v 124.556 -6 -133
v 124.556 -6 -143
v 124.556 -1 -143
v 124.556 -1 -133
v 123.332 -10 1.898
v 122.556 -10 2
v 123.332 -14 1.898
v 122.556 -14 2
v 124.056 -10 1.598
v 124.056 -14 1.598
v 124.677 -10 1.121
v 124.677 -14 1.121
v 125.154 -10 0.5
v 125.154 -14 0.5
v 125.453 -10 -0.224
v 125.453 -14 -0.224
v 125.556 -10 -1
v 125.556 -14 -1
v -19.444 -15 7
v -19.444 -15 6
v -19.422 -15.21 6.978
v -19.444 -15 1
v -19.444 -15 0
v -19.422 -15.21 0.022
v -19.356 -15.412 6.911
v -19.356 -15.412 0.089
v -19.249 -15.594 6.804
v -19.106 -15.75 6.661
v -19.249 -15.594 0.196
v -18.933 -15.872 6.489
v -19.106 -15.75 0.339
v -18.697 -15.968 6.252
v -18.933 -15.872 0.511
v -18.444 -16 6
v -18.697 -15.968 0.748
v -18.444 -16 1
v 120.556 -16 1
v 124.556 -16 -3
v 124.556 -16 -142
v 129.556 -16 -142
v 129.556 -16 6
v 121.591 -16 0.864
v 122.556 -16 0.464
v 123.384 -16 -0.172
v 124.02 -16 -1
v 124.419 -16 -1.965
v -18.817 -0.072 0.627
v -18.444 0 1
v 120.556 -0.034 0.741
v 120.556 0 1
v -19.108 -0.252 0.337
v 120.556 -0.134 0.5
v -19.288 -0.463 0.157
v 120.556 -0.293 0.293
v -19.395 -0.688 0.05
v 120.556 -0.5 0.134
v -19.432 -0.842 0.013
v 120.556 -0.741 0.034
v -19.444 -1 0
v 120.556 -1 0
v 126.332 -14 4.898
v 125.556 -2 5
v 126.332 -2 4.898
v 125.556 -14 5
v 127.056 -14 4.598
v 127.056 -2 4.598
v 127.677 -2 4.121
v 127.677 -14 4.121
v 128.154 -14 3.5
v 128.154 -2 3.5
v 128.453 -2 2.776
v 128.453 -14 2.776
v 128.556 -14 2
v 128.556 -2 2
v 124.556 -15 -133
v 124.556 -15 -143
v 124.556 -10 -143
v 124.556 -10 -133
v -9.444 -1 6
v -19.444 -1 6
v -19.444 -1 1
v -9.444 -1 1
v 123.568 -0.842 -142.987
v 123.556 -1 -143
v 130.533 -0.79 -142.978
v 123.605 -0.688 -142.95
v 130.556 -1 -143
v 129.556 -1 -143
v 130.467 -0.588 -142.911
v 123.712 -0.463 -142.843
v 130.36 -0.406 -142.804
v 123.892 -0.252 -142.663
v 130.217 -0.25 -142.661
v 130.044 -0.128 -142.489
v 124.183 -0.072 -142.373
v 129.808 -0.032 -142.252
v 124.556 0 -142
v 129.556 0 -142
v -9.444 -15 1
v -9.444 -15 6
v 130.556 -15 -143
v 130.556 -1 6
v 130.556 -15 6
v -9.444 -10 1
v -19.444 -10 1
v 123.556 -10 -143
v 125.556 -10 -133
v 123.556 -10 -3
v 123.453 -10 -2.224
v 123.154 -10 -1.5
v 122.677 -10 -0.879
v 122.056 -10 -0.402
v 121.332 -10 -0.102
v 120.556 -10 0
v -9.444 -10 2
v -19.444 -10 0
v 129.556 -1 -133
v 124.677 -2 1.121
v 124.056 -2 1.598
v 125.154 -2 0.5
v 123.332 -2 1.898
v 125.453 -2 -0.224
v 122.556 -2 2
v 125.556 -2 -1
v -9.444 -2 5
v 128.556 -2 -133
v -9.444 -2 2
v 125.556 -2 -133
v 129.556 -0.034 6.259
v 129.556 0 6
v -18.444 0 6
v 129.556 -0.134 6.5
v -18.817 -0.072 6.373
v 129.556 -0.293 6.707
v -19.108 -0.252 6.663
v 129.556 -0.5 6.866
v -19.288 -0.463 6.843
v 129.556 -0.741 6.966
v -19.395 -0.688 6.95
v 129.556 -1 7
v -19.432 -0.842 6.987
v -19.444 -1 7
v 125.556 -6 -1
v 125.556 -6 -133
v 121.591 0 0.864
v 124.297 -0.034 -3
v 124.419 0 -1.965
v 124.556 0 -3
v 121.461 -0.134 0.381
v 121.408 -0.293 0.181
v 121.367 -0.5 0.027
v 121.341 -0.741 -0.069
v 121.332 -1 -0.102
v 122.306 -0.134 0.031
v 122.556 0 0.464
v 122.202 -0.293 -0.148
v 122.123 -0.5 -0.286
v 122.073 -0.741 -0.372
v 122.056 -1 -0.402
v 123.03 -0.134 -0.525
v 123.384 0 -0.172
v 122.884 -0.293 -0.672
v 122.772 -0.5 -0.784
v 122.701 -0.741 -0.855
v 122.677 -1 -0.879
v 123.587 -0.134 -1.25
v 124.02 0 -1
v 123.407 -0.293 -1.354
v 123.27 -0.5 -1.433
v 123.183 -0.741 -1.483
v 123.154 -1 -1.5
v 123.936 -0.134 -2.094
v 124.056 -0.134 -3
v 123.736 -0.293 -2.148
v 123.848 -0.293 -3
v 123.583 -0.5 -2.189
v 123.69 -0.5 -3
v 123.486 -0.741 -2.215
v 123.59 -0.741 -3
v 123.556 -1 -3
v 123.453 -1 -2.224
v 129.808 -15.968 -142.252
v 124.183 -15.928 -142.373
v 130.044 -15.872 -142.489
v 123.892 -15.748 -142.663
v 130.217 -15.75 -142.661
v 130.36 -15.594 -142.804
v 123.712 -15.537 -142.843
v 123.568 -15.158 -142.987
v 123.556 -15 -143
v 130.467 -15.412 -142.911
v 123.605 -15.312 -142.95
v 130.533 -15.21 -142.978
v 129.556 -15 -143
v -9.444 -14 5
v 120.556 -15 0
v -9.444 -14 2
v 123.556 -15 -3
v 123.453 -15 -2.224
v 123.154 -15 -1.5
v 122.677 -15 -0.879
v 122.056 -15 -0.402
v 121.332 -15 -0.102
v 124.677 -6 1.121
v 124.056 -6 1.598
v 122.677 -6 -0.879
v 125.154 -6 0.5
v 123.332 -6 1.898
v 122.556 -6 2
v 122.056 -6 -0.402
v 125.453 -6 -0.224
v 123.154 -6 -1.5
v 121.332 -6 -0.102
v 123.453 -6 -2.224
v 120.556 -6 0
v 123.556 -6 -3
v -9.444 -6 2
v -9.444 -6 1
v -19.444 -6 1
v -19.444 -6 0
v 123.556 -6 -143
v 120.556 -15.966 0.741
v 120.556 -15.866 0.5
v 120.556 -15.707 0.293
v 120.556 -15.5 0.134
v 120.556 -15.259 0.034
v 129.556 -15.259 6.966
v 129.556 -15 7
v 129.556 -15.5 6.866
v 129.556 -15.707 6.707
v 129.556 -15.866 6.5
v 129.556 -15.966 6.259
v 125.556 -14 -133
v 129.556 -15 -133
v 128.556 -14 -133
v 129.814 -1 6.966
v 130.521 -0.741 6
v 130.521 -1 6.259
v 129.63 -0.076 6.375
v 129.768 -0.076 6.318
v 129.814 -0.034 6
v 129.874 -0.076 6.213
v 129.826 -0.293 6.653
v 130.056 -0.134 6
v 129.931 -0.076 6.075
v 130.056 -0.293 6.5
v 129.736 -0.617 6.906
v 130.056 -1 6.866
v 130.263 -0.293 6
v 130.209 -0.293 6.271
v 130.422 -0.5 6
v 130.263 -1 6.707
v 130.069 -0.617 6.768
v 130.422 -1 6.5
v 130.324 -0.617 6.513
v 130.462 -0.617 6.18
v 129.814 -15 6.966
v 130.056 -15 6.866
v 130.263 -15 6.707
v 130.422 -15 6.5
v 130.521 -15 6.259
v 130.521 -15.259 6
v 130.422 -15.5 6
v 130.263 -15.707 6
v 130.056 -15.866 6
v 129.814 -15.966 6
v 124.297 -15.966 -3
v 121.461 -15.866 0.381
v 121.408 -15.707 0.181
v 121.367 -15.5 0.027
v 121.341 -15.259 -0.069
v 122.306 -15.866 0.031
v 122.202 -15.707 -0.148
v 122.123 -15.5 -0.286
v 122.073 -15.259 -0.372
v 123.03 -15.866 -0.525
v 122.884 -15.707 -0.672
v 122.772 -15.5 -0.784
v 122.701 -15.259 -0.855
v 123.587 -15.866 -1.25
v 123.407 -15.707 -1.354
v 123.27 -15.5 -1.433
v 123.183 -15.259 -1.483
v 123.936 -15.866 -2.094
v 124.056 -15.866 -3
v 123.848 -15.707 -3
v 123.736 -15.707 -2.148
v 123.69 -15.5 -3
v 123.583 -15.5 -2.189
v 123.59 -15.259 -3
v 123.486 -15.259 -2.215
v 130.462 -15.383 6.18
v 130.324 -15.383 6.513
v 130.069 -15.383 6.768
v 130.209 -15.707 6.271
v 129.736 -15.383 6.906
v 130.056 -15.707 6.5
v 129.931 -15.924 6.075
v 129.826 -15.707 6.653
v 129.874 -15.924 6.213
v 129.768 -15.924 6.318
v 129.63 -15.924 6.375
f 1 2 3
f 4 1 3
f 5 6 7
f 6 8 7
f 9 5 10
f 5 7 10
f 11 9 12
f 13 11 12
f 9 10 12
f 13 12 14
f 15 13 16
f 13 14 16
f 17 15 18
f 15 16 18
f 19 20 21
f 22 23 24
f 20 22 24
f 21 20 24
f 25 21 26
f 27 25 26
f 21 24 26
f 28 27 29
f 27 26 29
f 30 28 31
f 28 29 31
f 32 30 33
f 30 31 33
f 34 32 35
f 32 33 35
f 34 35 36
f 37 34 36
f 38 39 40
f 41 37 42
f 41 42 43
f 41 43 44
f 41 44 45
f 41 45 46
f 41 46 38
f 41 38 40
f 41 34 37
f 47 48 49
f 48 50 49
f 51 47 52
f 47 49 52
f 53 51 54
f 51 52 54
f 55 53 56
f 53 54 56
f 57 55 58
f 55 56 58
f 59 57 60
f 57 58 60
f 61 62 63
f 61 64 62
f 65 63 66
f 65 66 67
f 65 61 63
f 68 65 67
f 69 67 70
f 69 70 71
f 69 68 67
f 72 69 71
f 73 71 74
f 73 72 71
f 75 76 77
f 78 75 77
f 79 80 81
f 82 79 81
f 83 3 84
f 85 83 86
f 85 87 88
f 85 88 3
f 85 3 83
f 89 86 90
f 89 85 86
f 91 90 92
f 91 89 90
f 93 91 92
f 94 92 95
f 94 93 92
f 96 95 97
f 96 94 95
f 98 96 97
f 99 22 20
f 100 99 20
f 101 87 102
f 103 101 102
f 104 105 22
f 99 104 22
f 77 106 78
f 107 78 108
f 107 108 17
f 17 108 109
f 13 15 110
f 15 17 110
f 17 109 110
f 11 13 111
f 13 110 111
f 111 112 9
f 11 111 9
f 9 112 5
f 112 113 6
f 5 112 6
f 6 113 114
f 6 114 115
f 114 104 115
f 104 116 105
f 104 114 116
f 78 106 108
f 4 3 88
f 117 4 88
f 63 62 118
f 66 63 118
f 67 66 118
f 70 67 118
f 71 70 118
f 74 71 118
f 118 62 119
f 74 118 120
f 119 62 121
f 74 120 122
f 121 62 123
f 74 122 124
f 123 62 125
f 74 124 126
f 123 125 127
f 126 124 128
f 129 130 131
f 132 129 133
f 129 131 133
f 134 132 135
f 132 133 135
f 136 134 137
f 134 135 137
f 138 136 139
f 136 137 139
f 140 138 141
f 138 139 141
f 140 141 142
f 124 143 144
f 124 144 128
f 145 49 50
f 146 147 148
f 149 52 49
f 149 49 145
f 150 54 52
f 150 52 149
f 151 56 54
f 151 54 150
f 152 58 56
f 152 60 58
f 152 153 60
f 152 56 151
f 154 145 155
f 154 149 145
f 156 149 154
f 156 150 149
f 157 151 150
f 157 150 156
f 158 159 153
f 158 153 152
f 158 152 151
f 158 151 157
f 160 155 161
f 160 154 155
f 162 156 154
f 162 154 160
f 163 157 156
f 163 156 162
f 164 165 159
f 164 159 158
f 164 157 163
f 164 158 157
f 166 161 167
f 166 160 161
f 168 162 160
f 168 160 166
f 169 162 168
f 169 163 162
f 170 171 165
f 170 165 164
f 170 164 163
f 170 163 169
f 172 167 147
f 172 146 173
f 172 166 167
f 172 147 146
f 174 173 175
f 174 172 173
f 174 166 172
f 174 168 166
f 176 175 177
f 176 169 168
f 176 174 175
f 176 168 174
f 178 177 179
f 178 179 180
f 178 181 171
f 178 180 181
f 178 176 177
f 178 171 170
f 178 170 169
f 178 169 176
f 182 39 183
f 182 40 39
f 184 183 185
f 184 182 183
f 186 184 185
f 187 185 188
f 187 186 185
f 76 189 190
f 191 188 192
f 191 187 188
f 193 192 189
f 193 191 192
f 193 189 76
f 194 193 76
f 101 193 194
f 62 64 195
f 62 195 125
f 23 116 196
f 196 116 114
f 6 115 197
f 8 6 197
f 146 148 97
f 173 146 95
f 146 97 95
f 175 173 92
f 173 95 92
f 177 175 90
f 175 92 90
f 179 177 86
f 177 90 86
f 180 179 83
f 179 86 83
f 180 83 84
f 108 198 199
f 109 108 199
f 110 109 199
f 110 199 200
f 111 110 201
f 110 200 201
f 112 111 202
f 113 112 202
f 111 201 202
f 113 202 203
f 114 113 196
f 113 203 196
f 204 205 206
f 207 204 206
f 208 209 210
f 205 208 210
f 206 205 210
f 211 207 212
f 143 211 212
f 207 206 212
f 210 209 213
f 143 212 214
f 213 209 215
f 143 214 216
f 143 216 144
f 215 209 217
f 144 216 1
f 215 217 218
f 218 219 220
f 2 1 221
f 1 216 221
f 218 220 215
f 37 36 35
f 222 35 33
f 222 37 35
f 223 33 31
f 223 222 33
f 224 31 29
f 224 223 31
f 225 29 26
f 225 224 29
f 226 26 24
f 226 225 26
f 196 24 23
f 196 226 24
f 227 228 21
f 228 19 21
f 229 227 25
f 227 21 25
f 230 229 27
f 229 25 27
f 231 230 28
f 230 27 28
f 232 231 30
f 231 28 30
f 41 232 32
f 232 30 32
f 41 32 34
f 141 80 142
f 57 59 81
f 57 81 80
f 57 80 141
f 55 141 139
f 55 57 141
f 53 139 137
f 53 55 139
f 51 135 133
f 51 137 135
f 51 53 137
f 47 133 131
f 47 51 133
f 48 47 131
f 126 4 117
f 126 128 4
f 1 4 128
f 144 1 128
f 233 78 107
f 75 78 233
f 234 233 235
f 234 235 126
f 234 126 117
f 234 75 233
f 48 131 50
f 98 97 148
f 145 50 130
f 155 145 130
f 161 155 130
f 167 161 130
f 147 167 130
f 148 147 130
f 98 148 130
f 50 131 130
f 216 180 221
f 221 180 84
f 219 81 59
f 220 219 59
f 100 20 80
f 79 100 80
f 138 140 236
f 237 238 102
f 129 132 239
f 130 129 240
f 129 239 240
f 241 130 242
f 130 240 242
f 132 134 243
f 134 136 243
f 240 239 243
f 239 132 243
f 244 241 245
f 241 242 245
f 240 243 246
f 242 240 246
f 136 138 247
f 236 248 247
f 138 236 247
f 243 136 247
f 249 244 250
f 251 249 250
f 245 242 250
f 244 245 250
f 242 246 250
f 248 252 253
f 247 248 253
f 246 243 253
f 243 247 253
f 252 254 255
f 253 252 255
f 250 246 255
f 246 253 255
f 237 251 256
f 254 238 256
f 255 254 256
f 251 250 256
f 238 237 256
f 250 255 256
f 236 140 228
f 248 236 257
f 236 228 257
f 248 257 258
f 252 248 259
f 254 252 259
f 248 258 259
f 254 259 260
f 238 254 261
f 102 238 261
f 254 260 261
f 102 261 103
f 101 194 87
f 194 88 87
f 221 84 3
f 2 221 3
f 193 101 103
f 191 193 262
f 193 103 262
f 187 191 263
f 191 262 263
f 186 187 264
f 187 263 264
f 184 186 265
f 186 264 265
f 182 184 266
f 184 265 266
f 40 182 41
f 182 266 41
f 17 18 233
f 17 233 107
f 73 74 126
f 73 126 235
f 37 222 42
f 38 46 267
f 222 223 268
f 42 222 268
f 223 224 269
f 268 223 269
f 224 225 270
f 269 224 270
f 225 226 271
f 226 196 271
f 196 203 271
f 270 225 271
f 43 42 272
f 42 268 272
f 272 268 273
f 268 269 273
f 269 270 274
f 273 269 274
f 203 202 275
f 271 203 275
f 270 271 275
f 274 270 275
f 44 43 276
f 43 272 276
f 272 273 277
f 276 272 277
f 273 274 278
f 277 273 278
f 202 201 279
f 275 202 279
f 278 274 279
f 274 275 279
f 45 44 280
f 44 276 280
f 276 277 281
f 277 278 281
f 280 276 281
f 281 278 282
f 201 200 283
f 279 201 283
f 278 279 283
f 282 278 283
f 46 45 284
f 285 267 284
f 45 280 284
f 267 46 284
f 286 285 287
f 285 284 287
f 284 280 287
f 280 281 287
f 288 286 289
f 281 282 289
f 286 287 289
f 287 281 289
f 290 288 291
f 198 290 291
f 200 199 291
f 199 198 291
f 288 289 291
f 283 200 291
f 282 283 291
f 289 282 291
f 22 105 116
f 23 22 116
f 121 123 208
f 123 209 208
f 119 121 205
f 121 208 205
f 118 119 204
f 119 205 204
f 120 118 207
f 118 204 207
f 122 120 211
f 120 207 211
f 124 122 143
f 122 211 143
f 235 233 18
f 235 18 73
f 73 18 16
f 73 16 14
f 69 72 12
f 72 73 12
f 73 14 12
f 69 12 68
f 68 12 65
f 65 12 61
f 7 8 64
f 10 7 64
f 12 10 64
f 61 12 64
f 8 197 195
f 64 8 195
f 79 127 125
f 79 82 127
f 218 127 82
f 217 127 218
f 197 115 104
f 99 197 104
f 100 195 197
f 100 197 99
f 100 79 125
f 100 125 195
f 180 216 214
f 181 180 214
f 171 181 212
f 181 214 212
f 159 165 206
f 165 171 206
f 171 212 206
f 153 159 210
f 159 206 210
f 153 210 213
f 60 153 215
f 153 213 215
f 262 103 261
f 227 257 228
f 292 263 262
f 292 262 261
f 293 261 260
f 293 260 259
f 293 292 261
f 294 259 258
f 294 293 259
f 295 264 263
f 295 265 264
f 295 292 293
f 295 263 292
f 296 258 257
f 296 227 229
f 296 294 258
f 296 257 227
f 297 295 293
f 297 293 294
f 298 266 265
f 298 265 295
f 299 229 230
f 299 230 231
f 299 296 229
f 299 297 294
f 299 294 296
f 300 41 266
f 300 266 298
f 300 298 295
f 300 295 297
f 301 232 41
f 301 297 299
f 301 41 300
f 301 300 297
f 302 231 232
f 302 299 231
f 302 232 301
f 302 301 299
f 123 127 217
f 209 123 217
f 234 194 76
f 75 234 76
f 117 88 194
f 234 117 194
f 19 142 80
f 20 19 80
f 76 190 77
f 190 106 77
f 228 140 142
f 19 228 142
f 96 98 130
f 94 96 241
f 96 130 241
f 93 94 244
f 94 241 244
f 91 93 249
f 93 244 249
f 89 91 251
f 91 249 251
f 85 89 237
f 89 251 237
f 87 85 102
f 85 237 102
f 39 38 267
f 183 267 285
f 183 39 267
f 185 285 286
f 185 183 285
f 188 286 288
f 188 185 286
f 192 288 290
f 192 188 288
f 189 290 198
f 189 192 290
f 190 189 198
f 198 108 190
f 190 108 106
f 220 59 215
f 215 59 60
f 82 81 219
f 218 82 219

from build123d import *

# Parameters (mm, degrees)
F1_DEPTH  = 16
F3_DEPTH  = 148
F5_DEPTH  = 148
F6_R      = 3
F7_R      = 3
F8_R      = 1
F9_R      = 1
F11_DEPTH = 10
F13_DEPTH = 10


with BuildPart() as f1:
    # F0 (on Front) → F1 (new body)
    with BuildSketch(Plane.XZ):
        Polygon((130.5555550784, 7), (-19.4444449216, 7), (-19.4444449216, 0), (123.5555550784, 0), (123.5555550784, -143), (130.5555550784, -143), align=None)
    extrude(amount=F1_DEPTH)

    # F2 (on face) → F3 (cut)
    with BuildSketch(Plane(origin=(0, 0, -143), x_dir=(1, 0, 0), z_dir=(0, 0, -1))):
        Polygon((125.5555550784, 10), (123.5555550784, 10), (123.5555550784, 6), (125.5555550784, 6), (125.5555550784, 2), (128.5555550784, 2), (128.5555550784, 14), (125.5555550784, 14), align=None)
    extrude(amount=-F3_DEPTH, mode=Mode.SUBTRACT)

    # F4 (on face) → F5 (cut)
    with BuildSketch(Plane(origin=(-19.4444449216, 0, 0), x_dir=(0, -1, 0), z_dir=(-1, 0, 0))):
        Polygon((6, 2), (6, 0), (10, 0), (10, 2), (14, 2), (14, 5), (2, 5), (2, 2), align=None)
    extrude(amount=-F5_DEPTH, mode=Mode.SUBTRACT)

    # F6
    f6_edges = [f1.edges().sort_by_distance(p)[0] for p in [
        (128.555555, -8, 5),
        (123.555555, -3, 0),
        (123.555555, -13, 0),
    ]]
    fillet(f6_edges, radius=F6_R)

    # F7
    f7_edges = [f1.edges().sort_by_distance(p)[0] for p in [
        (125.555555, -4, 2),
        (125.555555, -12, 2),
    ]]
    fillet(f7_edges, radius=F7_R)

    # F8
    f8_edges = [f1.edges().sort_by_distance(p)[0] for p in [
        (130.555555, -8, 7),
        (55.555555, 0, 7),
        (50.555555, 0, 0),
        (122.676875, 0, -0.87868),
        (-19.444445, 0, 3.5),
        (123.555555, 0, -73),
        (127.055555, 0, -143),
        (130.555555, 0, -68),
    ]]
    fillet(f8_edges, radius=F8_R)

    # F9
    f9_edges = [f1.edges().sort_by_distance(p)[0] for p in [
        (55.055555, -16, 7),
        (130.262662, -16, 6.707107),
        (-19.444445, -16, 3.5),
        (130.555555, -16, -68.5),
        (50.555555, -16, 0),
        (127.055555, -16, -143),
        (122.676875, -16, -0.87868),
        (123.555555, -16, -73),
    ]]
    fillet(f9_edges, radius=F9_R)

    # F10 (on face) → F11 (cut)
    with BuildSketch(Plane(origin=(-19.4444449216, 0, 0), x_dir=(0, -1, 0), z_dir=(-1, 0, 0))):
        Polygon((10, 1), (15, 1), (15, 6), (1, 6), (1, 1), (6, 1), (6, 2), (2, 2), (2, 5), (14, 5), (14, 2), (10, 2), align=None)
    extrude(amount=-F11_DEPTH, mode=Mode.SUBTRACT)

    # F12 (on face) → F13 (cut)
    with BuildSketch(Plane(origin=(0, 0, -143), x_dir=(1, 0, 0), z_dir=(0, 0, -1))):
        Polygon((129.5555550784, 15), (124.5555550784, 15), (124.5555550784, 10), (125.5555550784, 10), (125.5555550784, 14), (128.5555550784, 14), (128.5555550784, 2), (125.5555550784, 2), (125.5555550784, 6), (124.5555550784, 6), (124.5555550784, 1), (129.5555550784, 1), align=None)
    extrude(amount=-F13_DEPTH, mode=Mode.SUBTRACT)


solid = f1.part
